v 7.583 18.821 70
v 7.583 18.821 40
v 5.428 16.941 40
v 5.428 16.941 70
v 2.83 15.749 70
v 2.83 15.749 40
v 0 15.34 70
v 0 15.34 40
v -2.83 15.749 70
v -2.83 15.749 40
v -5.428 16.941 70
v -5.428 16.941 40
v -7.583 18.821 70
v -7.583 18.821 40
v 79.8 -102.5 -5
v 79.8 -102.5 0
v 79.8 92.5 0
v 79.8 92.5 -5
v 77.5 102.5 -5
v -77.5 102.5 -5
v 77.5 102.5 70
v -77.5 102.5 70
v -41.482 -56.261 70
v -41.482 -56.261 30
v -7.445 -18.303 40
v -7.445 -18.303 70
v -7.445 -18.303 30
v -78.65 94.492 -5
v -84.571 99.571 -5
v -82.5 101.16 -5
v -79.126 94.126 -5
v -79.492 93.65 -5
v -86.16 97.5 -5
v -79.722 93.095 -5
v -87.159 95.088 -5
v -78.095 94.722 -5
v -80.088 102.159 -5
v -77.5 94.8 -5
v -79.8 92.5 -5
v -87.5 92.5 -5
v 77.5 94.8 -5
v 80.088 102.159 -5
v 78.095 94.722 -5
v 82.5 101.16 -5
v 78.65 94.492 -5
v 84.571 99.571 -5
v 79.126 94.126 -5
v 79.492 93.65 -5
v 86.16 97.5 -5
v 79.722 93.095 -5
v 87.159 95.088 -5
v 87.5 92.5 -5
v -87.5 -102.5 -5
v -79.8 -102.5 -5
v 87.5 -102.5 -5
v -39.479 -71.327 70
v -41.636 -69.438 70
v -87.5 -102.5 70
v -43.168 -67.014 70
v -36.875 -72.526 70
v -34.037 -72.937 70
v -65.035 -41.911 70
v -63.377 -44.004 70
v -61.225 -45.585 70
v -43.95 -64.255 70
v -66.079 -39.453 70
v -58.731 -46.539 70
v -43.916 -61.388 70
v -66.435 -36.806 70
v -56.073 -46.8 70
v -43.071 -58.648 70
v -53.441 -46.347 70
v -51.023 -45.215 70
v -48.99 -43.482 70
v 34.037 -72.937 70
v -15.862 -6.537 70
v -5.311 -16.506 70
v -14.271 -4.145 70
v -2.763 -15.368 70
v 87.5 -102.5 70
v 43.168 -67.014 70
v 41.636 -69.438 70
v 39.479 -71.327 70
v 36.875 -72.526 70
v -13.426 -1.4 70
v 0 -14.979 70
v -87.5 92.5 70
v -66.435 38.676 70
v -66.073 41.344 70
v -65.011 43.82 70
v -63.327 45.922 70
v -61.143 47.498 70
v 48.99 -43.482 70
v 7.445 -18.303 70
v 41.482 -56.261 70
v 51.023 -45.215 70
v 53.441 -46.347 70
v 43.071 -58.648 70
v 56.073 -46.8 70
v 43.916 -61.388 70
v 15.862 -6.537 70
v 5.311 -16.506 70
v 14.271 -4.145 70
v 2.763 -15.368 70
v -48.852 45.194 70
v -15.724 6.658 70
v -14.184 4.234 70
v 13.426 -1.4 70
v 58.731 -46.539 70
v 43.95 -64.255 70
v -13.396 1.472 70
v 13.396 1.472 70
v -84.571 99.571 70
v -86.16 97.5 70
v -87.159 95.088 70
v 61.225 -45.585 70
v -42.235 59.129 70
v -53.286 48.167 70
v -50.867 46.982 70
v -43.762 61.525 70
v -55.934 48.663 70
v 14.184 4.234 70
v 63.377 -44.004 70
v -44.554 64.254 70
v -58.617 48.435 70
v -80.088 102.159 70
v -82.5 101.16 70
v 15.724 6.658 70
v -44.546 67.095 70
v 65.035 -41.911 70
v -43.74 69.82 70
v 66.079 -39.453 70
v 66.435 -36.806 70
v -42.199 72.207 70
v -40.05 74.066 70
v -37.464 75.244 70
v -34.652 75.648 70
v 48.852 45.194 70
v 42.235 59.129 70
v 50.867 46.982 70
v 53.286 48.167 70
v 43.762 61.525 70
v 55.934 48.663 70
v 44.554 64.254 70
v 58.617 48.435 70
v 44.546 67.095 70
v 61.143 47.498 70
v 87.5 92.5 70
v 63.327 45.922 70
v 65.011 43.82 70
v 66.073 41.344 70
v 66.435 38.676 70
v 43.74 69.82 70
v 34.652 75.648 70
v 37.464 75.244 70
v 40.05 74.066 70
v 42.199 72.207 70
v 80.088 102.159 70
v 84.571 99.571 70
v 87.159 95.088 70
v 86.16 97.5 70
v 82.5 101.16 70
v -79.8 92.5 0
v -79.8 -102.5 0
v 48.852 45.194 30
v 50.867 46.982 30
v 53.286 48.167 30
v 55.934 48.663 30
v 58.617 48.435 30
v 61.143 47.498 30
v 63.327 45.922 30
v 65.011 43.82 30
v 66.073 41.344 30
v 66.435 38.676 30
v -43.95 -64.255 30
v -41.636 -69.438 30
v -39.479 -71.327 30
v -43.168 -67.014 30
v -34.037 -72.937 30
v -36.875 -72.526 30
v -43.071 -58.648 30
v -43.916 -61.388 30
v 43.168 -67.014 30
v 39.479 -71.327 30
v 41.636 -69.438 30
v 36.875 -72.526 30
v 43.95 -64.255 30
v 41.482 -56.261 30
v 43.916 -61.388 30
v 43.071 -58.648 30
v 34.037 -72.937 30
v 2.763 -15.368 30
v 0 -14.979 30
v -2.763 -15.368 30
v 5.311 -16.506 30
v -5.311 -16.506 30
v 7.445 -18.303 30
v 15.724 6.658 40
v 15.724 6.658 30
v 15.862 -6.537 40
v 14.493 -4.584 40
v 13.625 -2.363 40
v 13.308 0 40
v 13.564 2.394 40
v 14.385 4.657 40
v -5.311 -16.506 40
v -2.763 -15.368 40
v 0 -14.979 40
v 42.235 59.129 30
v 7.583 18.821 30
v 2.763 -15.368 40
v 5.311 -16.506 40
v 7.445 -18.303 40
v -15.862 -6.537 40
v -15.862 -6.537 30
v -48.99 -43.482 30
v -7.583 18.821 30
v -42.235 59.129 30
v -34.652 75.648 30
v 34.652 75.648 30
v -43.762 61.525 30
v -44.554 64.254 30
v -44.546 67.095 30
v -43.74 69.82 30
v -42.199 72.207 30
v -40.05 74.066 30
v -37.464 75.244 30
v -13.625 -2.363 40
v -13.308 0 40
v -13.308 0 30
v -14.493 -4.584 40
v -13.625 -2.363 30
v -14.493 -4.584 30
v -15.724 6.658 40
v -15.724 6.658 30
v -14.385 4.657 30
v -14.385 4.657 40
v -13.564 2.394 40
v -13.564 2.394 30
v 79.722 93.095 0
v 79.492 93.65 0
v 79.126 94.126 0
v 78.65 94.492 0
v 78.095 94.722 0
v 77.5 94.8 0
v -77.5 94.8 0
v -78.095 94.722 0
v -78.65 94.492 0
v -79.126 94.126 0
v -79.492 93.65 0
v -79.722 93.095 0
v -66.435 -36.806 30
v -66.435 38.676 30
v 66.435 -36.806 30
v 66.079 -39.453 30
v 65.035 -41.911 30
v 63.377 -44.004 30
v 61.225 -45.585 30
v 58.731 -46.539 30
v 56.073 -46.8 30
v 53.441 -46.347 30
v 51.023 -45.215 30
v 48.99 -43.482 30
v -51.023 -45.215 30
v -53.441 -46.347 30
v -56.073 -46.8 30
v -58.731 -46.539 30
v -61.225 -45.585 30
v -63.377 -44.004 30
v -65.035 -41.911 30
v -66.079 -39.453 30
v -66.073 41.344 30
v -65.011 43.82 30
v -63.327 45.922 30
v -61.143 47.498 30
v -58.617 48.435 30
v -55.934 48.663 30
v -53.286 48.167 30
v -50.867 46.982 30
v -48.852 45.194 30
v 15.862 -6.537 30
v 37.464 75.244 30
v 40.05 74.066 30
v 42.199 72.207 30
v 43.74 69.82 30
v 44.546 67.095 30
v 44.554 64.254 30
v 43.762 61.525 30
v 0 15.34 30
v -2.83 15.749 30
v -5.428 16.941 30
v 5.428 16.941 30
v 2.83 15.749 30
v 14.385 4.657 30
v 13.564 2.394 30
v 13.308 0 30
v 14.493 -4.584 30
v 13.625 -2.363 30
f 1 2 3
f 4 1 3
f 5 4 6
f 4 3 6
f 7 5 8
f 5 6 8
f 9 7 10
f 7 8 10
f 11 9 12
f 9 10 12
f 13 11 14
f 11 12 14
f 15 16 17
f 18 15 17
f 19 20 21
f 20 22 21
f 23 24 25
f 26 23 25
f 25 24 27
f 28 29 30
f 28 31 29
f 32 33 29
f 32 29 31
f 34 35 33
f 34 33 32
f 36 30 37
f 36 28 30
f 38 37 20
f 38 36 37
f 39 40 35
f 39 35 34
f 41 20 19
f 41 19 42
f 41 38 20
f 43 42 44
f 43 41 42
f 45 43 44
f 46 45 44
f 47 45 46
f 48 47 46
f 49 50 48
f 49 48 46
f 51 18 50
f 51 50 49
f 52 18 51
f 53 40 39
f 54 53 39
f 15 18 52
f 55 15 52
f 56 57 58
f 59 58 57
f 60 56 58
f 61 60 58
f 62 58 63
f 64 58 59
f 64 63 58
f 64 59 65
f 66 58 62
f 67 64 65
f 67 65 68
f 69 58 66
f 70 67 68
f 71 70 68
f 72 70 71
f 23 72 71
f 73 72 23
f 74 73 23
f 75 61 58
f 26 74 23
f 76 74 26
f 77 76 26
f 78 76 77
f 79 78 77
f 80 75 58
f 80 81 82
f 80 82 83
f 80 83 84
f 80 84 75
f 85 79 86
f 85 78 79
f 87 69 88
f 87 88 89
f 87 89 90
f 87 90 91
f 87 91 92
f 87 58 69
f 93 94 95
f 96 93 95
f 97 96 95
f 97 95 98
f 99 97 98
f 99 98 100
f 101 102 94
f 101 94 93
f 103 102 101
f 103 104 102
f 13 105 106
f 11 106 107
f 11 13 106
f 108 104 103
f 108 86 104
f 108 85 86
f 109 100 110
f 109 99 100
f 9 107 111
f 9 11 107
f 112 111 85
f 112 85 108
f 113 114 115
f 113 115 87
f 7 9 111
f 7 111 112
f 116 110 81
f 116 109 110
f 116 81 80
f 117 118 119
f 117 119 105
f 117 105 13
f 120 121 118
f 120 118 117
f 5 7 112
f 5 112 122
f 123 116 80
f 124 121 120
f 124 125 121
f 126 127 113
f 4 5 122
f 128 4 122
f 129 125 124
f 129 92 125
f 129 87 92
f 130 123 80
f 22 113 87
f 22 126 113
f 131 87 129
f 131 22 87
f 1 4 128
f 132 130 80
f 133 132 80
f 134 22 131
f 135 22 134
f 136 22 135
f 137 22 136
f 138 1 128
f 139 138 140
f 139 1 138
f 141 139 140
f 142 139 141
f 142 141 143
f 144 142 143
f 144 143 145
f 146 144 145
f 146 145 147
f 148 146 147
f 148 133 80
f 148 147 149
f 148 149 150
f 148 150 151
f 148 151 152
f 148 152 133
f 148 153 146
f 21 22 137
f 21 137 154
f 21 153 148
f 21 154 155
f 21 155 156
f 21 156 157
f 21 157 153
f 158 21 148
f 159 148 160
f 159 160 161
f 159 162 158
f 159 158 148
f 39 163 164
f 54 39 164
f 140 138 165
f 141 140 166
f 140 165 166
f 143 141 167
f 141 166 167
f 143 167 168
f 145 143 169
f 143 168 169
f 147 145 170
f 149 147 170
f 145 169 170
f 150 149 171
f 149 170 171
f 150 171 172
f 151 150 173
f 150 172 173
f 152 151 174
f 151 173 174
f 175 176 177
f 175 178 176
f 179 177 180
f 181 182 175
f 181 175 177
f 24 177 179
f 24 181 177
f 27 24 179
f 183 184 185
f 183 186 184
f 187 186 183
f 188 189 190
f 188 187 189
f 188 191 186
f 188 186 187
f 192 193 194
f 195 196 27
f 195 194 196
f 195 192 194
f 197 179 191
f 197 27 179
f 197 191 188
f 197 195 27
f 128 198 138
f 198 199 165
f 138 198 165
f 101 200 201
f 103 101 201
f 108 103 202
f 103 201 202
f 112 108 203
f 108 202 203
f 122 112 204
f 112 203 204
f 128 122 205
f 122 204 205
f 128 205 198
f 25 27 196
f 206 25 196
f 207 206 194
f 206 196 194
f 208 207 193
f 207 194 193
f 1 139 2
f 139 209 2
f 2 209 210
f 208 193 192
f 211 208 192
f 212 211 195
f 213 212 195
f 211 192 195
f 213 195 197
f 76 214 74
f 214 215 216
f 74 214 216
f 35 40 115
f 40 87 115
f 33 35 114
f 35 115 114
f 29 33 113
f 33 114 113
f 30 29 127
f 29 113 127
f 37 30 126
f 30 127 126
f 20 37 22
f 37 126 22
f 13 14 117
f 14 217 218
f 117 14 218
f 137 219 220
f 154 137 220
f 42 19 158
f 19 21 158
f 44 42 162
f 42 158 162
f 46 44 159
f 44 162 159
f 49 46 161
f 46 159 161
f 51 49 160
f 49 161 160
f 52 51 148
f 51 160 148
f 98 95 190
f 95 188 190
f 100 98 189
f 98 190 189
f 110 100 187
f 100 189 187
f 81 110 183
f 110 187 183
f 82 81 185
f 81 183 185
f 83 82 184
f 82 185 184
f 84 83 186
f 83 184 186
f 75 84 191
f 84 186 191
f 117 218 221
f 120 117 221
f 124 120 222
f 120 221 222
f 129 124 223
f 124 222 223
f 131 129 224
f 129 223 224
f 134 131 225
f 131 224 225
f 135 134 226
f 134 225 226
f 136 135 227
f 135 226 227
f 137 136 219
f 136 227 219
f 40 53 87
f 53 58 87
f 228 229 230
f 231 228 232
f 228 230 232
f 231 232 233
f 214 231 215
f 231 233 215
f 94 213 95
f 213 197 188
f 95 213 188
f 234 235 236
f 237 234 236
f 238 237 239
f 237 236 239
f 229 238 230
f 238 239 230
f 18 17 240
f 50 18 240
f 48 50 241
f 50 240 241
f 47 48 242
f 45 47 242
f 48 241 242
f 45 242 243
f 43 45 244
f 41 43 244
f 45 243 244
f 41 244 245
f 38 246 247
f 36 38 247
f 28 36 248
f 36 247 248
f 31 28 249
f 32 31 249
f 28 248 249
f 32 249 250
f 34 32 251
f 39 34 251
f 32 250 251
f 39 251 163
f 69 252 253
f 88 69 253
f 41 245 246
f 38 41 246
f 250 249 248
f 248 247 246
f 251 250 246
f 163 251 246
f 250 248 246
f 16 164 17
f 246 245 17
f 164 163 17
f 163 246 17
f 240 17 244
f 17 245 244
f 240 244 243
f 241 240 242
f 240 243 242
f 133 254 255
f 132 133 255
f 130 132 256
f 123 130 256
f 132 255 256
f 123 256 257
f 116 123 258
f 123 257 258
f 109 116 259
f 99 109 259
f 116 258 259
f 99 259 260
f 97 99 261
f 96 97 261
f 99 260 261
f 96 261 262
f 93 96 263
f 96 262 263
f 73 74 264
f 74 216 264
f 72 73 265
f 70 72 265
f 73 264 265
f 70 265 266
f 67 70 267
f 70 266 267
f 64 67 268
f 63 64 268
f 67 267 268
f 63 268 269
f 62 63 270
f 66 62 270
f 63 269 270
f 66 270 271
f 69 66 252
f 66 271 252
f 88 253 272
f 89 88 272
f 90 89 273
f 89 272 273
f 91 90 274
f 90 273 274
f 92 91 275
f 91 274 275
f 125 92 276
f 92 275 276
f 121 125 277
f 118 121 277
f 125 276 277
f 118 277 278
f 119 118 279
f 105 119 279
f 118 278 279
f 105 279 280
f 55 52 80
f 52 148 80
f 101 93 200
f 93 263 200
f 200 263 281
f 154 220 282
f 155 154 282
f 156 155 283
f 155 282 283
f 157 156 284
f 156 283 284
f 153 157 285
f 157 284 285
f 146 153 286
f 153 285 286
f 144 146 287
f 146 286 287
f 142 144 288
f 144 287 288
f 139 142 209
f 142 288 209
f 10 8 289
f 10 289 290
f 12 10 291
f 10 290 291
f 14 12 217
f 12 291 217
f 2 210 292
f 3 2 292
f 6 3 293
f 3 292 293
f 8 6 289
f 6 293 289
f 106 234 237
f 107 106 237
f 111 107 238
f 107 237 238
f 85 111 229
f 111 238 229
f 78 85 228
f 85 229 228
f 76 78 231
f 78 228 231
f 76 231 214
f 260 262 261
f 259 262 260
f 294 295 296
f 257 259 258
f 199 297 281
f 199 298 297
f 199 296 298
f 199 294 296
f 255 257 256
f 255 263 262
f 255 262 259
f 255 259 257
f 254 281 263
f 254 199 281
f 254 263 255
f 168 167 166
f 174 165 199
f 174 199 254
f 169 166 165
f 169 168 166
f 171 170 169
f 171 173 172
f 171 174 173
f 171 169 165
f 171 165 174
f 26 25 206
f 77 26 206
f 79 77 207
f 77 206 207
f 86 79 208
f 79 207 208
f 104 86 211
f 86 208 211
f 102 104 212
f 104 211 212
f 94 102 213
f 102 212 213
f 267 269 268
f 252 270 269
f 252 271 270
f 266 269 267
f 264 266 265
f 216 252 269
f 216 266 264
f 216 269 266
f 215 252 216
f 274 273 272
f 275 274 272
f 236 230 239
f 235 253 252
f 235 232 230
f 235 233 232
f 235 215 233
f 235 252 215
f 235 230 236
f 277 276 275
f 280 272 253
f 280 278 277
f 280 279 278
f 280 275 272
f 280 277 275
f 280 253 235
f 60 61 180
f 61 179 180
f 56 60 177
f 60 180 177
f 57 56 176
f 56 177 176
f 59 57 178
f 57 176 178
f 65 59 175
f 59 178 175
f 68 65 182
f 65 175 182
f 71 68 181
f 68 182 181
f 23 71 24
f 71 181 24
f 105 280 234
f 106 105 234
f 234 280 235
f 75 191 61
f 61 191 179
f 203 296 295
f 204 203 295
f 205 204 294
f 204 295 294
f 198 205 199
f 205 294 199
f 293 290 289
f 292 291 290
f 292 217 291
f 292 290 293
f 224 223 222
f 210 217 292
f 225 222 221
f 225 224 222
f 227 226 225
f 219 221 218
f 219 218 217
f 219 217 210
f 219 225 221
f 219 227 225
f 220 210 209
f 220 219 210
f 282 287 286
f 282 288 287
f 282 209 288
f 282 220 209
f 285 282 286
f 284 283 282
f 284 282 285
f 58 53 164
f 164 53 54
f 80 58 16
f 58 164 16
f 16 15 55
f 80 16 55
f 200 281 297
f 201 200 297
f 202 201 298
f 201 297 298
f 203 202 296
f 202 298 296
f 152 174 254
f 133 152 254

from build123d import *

# Parameters (mm, degrees)
F1_DEPTH = 40
F2_DEPTH = 30
F4_DEPTH = 5


with BuildPart() as f1:
    # F0 (on Top) → F1 (new body)
    with BuildSketch(Plane.XY):
        with BuildLine():
            Line((77.5, 102.5), (-77.5, 102.5))
            ThreePointArc((-77.5, 102.5), (-84.5710678119, 99.5710678119), (-87.5, 92.5))
            Line((-87.5, 92.5), (-87.5, -102.5))
            Line((-87.5, -102.5), (87.5, -102.5))
            Line((87.5, -102.5), (87.5, 92.5))
            ThreePointArc((87.5, 92.5), (84.5710678119, 99.5710678119), (77.5, 102.5))
        make_face()
        with BuildLine():
            Line((34.0369748181, -72.9371830821), (0, -72.9371830821))
            Line((0, -72.9371830821), (-34.0369748181, -72.9371830821))
            ThreePointArc((-34.0369748181, -72.9371830821), (-43.1682512678, -67.0139207973), (-41.4821386363, -56.2611411619))
            Line((-41.4821386363, -56.2611411619), (-7.4451638182, -18.3028933823))
            ThreePointArc((-7.4451638182, -18.3028933823), (-4.0767377152, -15.8476588528), (0, -14.9789353025))
            ThreePointArc((0, -14.9789353025), (4.0767377152, -15.8476588528), (7.4451638182, -18.3028933823))
            Line((7.4451638182, -18.3028933823), (41.4821386363, -56.2611411619))
            ThreePointArc((41.4821386363, -56.2611411619), (43.1682512678, -67.0139207973), (34.0369748181, -72.9371830821))
        make_face(mode=Mode.SUBTRACT)
        with BuildLine():
            ThreePointArc((-15.7237331079, 6.6580487109), (-13.9065454363, 3.5500843616), (-13.3077846694, 0))
            ThreePointArc((-13.3077846694, 0), (-13.9924233337, -3.4998755874), (-15.8616535148, -6.536952761))
            Line((-15.8616535148, -6.536952761), (-48.9902999084, -43.482226985))
            ThreePointArc((-48.9902999084, -43.482226985), (-60.0095623414, -46.1456614468), (-66.4354637265, -36.8061850647))
            Line((-66.4354637265, -36.8061850647), (-66.4354637265, 0))
            Line((-66.4354637265, 0), (-66.4354637265, 38.6755018914))
            ThreePointArc((-66.4354637265, 38.6755018914), (-59.9117518151, 48.0518242582), (-48.8523795015, 45.194461443))
            Line((-48.8523795015, 45.194461443), (-15.7237331079, 6.6580487109))
        make_face(mode=Mode.SUBTRACT)
        with BuildLine():
            ThreePointArc((15.8616535148, -6.536952761), (13.9924233337, -3.4998755874), (13.3077846694, 0))
            ThreePointArc((13.3077846694, 0), (13.9065454363, 3.5500843616), (15.7237331079, 6.6580487109))
            Line((15.7237331079, 6.6580487109), (48.8523795015, 45.194461443))
            ThreePointArc((48.8523795015, 45.194461443), (59.9117518151, 48.0518242582), (66.4354637265, 38.6755018914))
            Line((66.4354637265, 38.6755018914), (66.4354637265, 0))
            Line((66.4354637265, 0), (66.4354637265, -36.8061850647))
            ThreePointArc((66.4354637265, -36.8061850647), (60.0095623414, -46.1456614468), (48.9902999084, -43.482226985))
            Line((48.9902999084, -43.482226985), (15.8616535148, -6.536952761))
        make_face(mode=Mode.SUBTRACT)
        with BuildLine():
            ThreePointArc((7.5830842251, 18.8209116668), (4.1719542473, 16.2517032096), (0, 15.3398712185))
            ThreePointArc((0, 15.3398712185), (-4.1719542473, 16.2517032096), (-7.5830842251, 18.8209116668))
            Line((-7.5830842251, 18.8209116668), (-42.2345889959, 59.1287671034))
            ThreePointArc((-42.2345889959, 59.1287671034), (-43.7396727798, 69.8196809024), (-34.6515047709, 75.647726655))
            Line((-34.6515047709, 75.647726655), (0, 75.647726655))
            Line((0, 75.647726655), (34.6515047709, 75.647726655))
            ThreePointArc((34.6515047709, 75.647726655), (43.7396727798, 69.8196809024), (42.2345889959, 59.1287671034))
            Line((42.2345889959, 59.1287671034), (7.5830842251, 18.8209116668))
        make_face(mode=Mode.SUBTRACT)
    extrude(amount=F1_DEPTH)

    # F0 (on Top) + F1_face (on face) → F2 (join)
    with BuildSketch(Plane.XY):
        with BuildLine():
            Line((77.5, 102.5), (-77.5, 102.5))
            ThreePointArc((-77.5, 102.5), (-84.5710678119, 99.5710678119), (-87.5, 92.5))
            Line((-87.5, 92.5), (-87.5, -102.5))
            Line((-87.5, -102.5), (87.5, -102.5))
            Line((87.5, -102.5), (87.5, 92.5))
            ThreePointArc((87.5, 92.5), (84.5710678119, 99.5710678119), (77.5, 102.5))
        make_face()
        with BuildLine():
            Line((34.0369748181, -72.9371830821), (0, -72.9371830821))
            Line((0, -72.9371830821), (-34.0369748181, -72.9371830821))
            ThreePointArc((-34.0369748181, -72.9371830821), (-43.1682512678, -67.0139207973), (-41.4821386363, -56.2611411619))
            Line((-41.4821386363, -56.2611411619), (-7.4451638182, -18.3028933823))
            ThreePointArc((-7.4451638182, -18.3028933823), (-4.0767377152, -15.8476588528), (0, -14.9789353025))
            ThreePointArc((0, -14.9789353025), (4.0767377152, -15.8476588528), (7.4451638182, -18.3028933823))
            Line((7.4451638182, -18.3028933823), (41.4821386363, -56.2611411619))
            ThreePointArc((41.4821386363, -56.2611411619), (43.1682512678, -67.0139207973), (34.0369748181, -72.9371830821))
        make_face(mode=Mode.SUBTRACT)
        with BuildLine():
            ThreePointArc((-15.7237331079, 6.6580487109), (-13.9065454363, 3.5500843616), (-13.3077846694, 0))
            ThreePointArc((-13.3077846694, 0), (-13.9924233337, -3.4998755874), (-15.8616535148, -6.536952761))
            Line((-15.8616535148, -6.536952761), (-48.9902999084, -43.482226985))
            ThreePointArc((-48.9902999084, -43.482226985), (-60.0095623414, -46.1456614468), (-66.4354637265, -36.8061850647))
            Line((-66.4354637265, -36.8061850647), (-66.4354637265, 0))
            Line((-66.4354637265, 0), (-66.4354637265, 38.6755018914))
            ThreePointArc((-66.4354637265, 38.6755018914), (-59.9117518151, 48.0518242582), (-48.8523795015, 45.194461443))
            Line((-48.8523795015, 45.194461443), (-15.7237331079, 6.6580487109))
        make_face(mode=Mode.SUBTRACT)
        with BuildLine():
            ThreePointArc((15.8616535148, -6.536952761), (13.9924233337, -3.4998755874), (13.3077846694, 0))
            ThreePointArc((13.3077846694, 0), (13.9065454363, 3.5500843616), (15.7237331079, 6.6580487109))
            Line((15.7237331079, 6.6580487109), (48.8523795015, 45.194461443))
            ThreePointArc((48.8523795015, 45.194461443), (59.9117518151, 48.0518242582), (66.4354637265, 38.6755018914))
            Line((66.4354637265, 38.6755018914), (66.4354637265, 0))
            Line((66.4354637265, 0), (66.4354637265, -36.8061850647))
            ThreePointArc((66.4354637265, -36.8061850647), (60.0095623414, -46.1456614468), (48.9902999084, -43.482226985))
            Line((48.9902999084, -43.482226985), (15.8616535148, -6.536952761))
        make_face(mode=Mode.SUBTRACT)
        with BuildLine():
            ThreePointArc((7.5830842251, 18.8209116668), (4.1719542473, 16.2517032096), (0, 15.3398712185))
            ThreePointArc((0, 15.3398712185), (-4.1719542473, 16.2517032096), (-7.5830842251, 18.8209116668))
            Line((-7.5830842251, 18.8209116668), (-42.2345889959, 59.1287671034))
            ThreePointArc((-42.2345889959, 59.1287671034), (-43.7396727798, 69.8196809024), (-34.6515047709, 75.647726655))
            Line((-34.6515047709, 75.647726655), (0, 75.647726655))
            Line((0, 75.647726655), (34.6515047709, 75.647726655))
            ThreePointArc((34.6515047709, 75.647726655), (43.7396727798, 69.8196809024), (42.2345889959, 59.1287671034))
            Line((42.2345889959, 59.1287671034), (7.5830842251, 18.8209116668))
        make_face(mode=Mode.SUBTRACT)
        with BuildLine():
            Line((-66.4354637265, 0), (-13.3077846694, 0))
            ThreePointArc((-13.3077846694, 0), (-13.9065454363, 3.5500843616), (-15.7237331079, 6.6580487109))
            Line((-15.7237331079, 6.6580487109), (-48.8523795015, 45.194461443))
            ThreePointArc((-48.8523795015, 45.194461443), (-59.9117518151, 48.0518242582), (-66.4354637265, 38.6755018914))
            Line((-66.4354637265, 38.6755018914), (-66.4354637265, 0))
        make_face()
        with BuildLine():
            ThreePointArc((-7.5830842251, 18.8209116668), (-4.1719542473, 16.2517032096), (0, 15.3398712185))
            Line((0, 15.3398712185), (0, 75.647726655))
            Line((0, 75.647726655), (-34.6515047709, 75.647726655))
            ThreePointArc((-34.6515047709, 75.647726655), (-43.7396727798, 69.8196809024), (-42.2345889959, 59.1287671034))
            Line((-42.2345889959, 59.1287671034), (-7.5830842251, 18.8209116668))
        make_face()
        with BuildLine():
            Line((0, 75.647726655), (0, 15.3398712185))
            ThreePointArc((0, 15.3398712185), (4.1719542473, 16.2517032096), (7.5830842251, 18.8209116668))
            Line((7.5830842251, 18.8209116668), (42.2345889959, 59.1287671034))
            ThreePointArc((42.2345889959, 59.1287671034), (43.7396727798, 69.8196809024), (34.6515047709, 75.647726655))
            Line((34.6515047709, 75.647726655), (0, 75.647726655))
        make_face()
        with BuildLine():
            ThreePointArc((15.7237331079, 6.6580487109), (13.9065454363, 3.5500843616), (13.3077846694, 0))
            Line((13.3077846694, 0), (66.4354637265, 0))
            Line((66.4354637265, 0), (66.4354637265, 38.6755018914))
            ThreePointArc((66.4354637265, 38.6755018914), (59.9117518151, 48.0518242582), (48.8523795015, 45.194461443))
            Line((48.8523795015, 45.194461443), (15.7237331079, 6.6580487109))
        make_face()
        with BuildLine():
            Line((66.4354637265, 0), (13.3077846694, 0))
            ThreePointArc((13.3077846694, 0), (13.9924233337, -3.4998755874), (15.8616535148, -6.536952761))
            Line((15.8616535148, -6.536952761), (48.9902999084, -43.482226985))
            ThreePointArc((48.9902999084, -43.482226985), (60.0095623414, -46.1456614468), (66.4354637265, -36.8061850647))
            Line((66.4354637265, -36.8061850647), (66.4354637265, 0))
        make_face()
        with BuildLine():
            Line((0, -14.9789353025), (0, -72.9371830821))
            Line((0, -72.9371830821), (34.0369748181, -72.9371830821))
            ThreePointArc((34.0369748181, -72.9371830821), (43.1682512678, -67.0139207973), (41.4821386363, -56.2611411619))
            Line((41.4821386363, -56.2611411619), (7.4451638182, -18.3028933823))
            ThreePointArc((7.4451638182, -18.3028933823), (4.0767377152, -15.8476588528), (0, -14.9789353025))
        make_face()
        with BuildLine():
            Line((-34.0369748181, -72.9371830821), (0, -72.9371830821))
            Line((0, -72.9371830821), (0, -14.9789353025))
            ThreePointArc((0, -14.9789353025), (-4.0767377152, -15.8476588528), (-7.4451638182, -18.3028933823))
            Line((-7.4451638182, -18.3028933823), (-41.4821386363, -56.2611411619))
            ThreePointArc((-41.4821386363, -56.2611411619), (-43.1682512678, -67.0139207973), (-34.0369748181, -72.9371830821))
        make_face()
        with BuildLine():
            ThreePointArc((-15.8616535148, -6.536952761), (-13.9924233337, -3.4998755874), (-13.3077846694, 0))
            Line((-13.3077846694, 0), (-66.4354637265, 0))
            Line((-66.4354637265, 0), (-66.4354637265, -36.8061850647))
            ThreePointArc((-66.4354637265, -36.8061850647), (-60.0095623414, -46.1456614468), (-48.9902999084, -43.482226985))
            Line((-48.9902999084, -43.482226985), (-15.8616535148, -6.536952761))
        make_face()
    with BuildSketch(Plane(origin=(0, -1.0794755955, 40), x_dir=(1, 0, 0), z_dir=(0, 0, 1))):
        with BuildLine():
            Line((77.5, 103.5794755955), (-77.5, 103.5794755955))
            ThreePointArc((-77.5, 103.5794755955), (-84.5710678119, 100.6505434074), (-87.5, 93.5794755955))
            Line((-87.5, 93.5794755955), (-87.5, -101.4205244045))
            Line((-87.5, -101.4205244045), (87.5, -101.4205244045))
            Line((87.5, -101.4205244045), (87.5, 93.5794755955))
            ThreePointArc((87.5, 93.5794755955), (84.5710678119, 100.6505434074), (77.5, 103.5794755955))
        make_face()
        with BuildLine():
            ThreePointArc((41.4821386363, -55.1816655664), (43.1682512678, -65.9344452018), (34.0369748181, -71.8577074866))
            Line((34.0369748181, -71.8577074866), (-34.0369748181, -71.8577074866))
            ThreePointArc((-34.0369748181, -71.8577074866), (-43.1682512678, -65.9344452018), (-41.4821386363, -55.1816655664))
            Line((-41.4821386363, -55.1816655664), (-7.4451638182, -17.2234177868))
            ThreePointArc((-7.4451638182, -17.2234177868), (0, -13.899459707), (7.4451638182, -17.2234177868))
            Line((7.4451638182, -17.2234177868), (41.4821386363, -55.1816655664))
        make_face(mode=Mode.SUBTRACT)
        with BuildLine():
            ThreePointArc((-15.7237331079, 7.7375243064), (-13.3073635592, 1.1140457264), (-15.8616535148, -5.4574771655))
            Line((-15.8616535148, -5.4574771655), (-48.9902999084, -42.4027513895))
            ThreePointArc((-48.9902999084, -42.4027513895), (-60.0095623414, -45.0661858513), (-66.4354637265, -35.7267094692))
            Line((-66.4354637265, -35.7267094692), (-66.4354637265, 39.7549774869))
            ThreePointArc((-66.4354637265, 39.7549774869), (-59.9117518151, 49.1312998537), (-48.8523795015, 46.2739370385))
            Line((-48.8523795015, 46.2739370385), (-15.7237331079, 7.7375243064))
        make_face(mode=Mode.SUBTRACT)
        with BuildLine():
            Line((48.9902999084, -42.4027513895), (15.8616535148, -5.4574771655))
            ThreePointArc((15.8616535148, -5.4574771655), (13.3073635592, 1.1140457264), (15.7237331079, 7.7375243064))
            Line((15.7237331079, 7.7375243064), (48.8523795015, 46.2739370385))
            ThreePointArc((48.8523795015, 46.2739370385), (59.9117518151, 49.1312998537), (66.4354637265, 39.7549774869))
            Line((66.4354637265, 39.7549774869), (66.4354637265, -35.7267094692))
            ThreePointArc((66.4354637265, -35.7267094692), (60.0095623414, -45.0661858513), (48.9902999084, -42.4027513895))
        make_face(mode=Mode.SUBTRACT)
        with BuildLine():
            Line((42.2345889959, 60.2082426989), (7.5830842251, 19.9003872623))
            ThreePointArc((7.5830842251, 19.9003872623), (0, 16.419346814), (-7.5830842251, 19.9003872623))
            Line((-7.5830842251, 19.9003872623), (-42.2345889959, 60.2082426989))
            ThreePointArc((-42.2345889959, 60.2082426989), (-43.7396727798, 70.8991564979), (-34.6515047709, 76.7272022505))
            Line((-34.6515047709, 76.7272022505), (34.6515047709, 76.7272022505))
            ThreePointArc((34.6515047709, 76.7272022505), (43.7396727798, 70.8991564979), (42.2345889959, 60.2082426989))
        make_face(mode=Mode.SUBTRACT)
    extrude(amount=F2_DEPTH)

    # F3 (on face) → F4 (join)
    with BuildSketch(Plane(origin=(0, 0, 0), x_dir=(1, 0, 0), z_dir=(0, 0, -1))):
        with BuildLine():
            Line((77.5, -94.8000022769), (-77.5, -94.8000022769))
            ThreePointArc((-77.5, -94.8000022769), (-79.1263472067, -94.1263472067), (-79.8000022769, -92.5))
            Line((-79.8000022769, -92.5), (-79.8000022769, 87.0887190104))
            Line((-79.8000022769, 87.0887190104), (-79.8000022769, 94.8000022769))
            Line((-79.8000022769, 94.8000022769), (-79.8000022769, 102.5))
            Line((-79.8000022769, 102.5), (-87.5, 102.5))
            Line((-87.5, 102.5), (-87.5, -92.5))
            ThreePointArc((-87.5, -92.5), (-84.5710678119, -99.5710678119), (-77.5, -102.5))
            Line((-77.5, -102.5), (77.5, -102.5))
            ThreePointArc((77.5, -102.5), (84.5710678119, -99.5710678119), (87.5, -92.5))
            Line((87.5, -92.5), (87.5, 102.5))
            Line((87.5, 102.5), (79.8000022769, 102.5))
            Line((79.8000022769, 102.5), (79.8000022769, 94.8000022769))
            Line((79.8000022769, 94.8000022769), (79.8000022769, 83.8265269995))
            Line((79.8000022769, 83.8265269995), (79.8000022769, -92.5))
            ThreePointArc((79.8000022769, -92.5), (79.1263472067, -94.1263472067), (77.5, -94.8000022769))
        make_face()
    extrude(amount=F4_DEPTH)


solid = f1.part
